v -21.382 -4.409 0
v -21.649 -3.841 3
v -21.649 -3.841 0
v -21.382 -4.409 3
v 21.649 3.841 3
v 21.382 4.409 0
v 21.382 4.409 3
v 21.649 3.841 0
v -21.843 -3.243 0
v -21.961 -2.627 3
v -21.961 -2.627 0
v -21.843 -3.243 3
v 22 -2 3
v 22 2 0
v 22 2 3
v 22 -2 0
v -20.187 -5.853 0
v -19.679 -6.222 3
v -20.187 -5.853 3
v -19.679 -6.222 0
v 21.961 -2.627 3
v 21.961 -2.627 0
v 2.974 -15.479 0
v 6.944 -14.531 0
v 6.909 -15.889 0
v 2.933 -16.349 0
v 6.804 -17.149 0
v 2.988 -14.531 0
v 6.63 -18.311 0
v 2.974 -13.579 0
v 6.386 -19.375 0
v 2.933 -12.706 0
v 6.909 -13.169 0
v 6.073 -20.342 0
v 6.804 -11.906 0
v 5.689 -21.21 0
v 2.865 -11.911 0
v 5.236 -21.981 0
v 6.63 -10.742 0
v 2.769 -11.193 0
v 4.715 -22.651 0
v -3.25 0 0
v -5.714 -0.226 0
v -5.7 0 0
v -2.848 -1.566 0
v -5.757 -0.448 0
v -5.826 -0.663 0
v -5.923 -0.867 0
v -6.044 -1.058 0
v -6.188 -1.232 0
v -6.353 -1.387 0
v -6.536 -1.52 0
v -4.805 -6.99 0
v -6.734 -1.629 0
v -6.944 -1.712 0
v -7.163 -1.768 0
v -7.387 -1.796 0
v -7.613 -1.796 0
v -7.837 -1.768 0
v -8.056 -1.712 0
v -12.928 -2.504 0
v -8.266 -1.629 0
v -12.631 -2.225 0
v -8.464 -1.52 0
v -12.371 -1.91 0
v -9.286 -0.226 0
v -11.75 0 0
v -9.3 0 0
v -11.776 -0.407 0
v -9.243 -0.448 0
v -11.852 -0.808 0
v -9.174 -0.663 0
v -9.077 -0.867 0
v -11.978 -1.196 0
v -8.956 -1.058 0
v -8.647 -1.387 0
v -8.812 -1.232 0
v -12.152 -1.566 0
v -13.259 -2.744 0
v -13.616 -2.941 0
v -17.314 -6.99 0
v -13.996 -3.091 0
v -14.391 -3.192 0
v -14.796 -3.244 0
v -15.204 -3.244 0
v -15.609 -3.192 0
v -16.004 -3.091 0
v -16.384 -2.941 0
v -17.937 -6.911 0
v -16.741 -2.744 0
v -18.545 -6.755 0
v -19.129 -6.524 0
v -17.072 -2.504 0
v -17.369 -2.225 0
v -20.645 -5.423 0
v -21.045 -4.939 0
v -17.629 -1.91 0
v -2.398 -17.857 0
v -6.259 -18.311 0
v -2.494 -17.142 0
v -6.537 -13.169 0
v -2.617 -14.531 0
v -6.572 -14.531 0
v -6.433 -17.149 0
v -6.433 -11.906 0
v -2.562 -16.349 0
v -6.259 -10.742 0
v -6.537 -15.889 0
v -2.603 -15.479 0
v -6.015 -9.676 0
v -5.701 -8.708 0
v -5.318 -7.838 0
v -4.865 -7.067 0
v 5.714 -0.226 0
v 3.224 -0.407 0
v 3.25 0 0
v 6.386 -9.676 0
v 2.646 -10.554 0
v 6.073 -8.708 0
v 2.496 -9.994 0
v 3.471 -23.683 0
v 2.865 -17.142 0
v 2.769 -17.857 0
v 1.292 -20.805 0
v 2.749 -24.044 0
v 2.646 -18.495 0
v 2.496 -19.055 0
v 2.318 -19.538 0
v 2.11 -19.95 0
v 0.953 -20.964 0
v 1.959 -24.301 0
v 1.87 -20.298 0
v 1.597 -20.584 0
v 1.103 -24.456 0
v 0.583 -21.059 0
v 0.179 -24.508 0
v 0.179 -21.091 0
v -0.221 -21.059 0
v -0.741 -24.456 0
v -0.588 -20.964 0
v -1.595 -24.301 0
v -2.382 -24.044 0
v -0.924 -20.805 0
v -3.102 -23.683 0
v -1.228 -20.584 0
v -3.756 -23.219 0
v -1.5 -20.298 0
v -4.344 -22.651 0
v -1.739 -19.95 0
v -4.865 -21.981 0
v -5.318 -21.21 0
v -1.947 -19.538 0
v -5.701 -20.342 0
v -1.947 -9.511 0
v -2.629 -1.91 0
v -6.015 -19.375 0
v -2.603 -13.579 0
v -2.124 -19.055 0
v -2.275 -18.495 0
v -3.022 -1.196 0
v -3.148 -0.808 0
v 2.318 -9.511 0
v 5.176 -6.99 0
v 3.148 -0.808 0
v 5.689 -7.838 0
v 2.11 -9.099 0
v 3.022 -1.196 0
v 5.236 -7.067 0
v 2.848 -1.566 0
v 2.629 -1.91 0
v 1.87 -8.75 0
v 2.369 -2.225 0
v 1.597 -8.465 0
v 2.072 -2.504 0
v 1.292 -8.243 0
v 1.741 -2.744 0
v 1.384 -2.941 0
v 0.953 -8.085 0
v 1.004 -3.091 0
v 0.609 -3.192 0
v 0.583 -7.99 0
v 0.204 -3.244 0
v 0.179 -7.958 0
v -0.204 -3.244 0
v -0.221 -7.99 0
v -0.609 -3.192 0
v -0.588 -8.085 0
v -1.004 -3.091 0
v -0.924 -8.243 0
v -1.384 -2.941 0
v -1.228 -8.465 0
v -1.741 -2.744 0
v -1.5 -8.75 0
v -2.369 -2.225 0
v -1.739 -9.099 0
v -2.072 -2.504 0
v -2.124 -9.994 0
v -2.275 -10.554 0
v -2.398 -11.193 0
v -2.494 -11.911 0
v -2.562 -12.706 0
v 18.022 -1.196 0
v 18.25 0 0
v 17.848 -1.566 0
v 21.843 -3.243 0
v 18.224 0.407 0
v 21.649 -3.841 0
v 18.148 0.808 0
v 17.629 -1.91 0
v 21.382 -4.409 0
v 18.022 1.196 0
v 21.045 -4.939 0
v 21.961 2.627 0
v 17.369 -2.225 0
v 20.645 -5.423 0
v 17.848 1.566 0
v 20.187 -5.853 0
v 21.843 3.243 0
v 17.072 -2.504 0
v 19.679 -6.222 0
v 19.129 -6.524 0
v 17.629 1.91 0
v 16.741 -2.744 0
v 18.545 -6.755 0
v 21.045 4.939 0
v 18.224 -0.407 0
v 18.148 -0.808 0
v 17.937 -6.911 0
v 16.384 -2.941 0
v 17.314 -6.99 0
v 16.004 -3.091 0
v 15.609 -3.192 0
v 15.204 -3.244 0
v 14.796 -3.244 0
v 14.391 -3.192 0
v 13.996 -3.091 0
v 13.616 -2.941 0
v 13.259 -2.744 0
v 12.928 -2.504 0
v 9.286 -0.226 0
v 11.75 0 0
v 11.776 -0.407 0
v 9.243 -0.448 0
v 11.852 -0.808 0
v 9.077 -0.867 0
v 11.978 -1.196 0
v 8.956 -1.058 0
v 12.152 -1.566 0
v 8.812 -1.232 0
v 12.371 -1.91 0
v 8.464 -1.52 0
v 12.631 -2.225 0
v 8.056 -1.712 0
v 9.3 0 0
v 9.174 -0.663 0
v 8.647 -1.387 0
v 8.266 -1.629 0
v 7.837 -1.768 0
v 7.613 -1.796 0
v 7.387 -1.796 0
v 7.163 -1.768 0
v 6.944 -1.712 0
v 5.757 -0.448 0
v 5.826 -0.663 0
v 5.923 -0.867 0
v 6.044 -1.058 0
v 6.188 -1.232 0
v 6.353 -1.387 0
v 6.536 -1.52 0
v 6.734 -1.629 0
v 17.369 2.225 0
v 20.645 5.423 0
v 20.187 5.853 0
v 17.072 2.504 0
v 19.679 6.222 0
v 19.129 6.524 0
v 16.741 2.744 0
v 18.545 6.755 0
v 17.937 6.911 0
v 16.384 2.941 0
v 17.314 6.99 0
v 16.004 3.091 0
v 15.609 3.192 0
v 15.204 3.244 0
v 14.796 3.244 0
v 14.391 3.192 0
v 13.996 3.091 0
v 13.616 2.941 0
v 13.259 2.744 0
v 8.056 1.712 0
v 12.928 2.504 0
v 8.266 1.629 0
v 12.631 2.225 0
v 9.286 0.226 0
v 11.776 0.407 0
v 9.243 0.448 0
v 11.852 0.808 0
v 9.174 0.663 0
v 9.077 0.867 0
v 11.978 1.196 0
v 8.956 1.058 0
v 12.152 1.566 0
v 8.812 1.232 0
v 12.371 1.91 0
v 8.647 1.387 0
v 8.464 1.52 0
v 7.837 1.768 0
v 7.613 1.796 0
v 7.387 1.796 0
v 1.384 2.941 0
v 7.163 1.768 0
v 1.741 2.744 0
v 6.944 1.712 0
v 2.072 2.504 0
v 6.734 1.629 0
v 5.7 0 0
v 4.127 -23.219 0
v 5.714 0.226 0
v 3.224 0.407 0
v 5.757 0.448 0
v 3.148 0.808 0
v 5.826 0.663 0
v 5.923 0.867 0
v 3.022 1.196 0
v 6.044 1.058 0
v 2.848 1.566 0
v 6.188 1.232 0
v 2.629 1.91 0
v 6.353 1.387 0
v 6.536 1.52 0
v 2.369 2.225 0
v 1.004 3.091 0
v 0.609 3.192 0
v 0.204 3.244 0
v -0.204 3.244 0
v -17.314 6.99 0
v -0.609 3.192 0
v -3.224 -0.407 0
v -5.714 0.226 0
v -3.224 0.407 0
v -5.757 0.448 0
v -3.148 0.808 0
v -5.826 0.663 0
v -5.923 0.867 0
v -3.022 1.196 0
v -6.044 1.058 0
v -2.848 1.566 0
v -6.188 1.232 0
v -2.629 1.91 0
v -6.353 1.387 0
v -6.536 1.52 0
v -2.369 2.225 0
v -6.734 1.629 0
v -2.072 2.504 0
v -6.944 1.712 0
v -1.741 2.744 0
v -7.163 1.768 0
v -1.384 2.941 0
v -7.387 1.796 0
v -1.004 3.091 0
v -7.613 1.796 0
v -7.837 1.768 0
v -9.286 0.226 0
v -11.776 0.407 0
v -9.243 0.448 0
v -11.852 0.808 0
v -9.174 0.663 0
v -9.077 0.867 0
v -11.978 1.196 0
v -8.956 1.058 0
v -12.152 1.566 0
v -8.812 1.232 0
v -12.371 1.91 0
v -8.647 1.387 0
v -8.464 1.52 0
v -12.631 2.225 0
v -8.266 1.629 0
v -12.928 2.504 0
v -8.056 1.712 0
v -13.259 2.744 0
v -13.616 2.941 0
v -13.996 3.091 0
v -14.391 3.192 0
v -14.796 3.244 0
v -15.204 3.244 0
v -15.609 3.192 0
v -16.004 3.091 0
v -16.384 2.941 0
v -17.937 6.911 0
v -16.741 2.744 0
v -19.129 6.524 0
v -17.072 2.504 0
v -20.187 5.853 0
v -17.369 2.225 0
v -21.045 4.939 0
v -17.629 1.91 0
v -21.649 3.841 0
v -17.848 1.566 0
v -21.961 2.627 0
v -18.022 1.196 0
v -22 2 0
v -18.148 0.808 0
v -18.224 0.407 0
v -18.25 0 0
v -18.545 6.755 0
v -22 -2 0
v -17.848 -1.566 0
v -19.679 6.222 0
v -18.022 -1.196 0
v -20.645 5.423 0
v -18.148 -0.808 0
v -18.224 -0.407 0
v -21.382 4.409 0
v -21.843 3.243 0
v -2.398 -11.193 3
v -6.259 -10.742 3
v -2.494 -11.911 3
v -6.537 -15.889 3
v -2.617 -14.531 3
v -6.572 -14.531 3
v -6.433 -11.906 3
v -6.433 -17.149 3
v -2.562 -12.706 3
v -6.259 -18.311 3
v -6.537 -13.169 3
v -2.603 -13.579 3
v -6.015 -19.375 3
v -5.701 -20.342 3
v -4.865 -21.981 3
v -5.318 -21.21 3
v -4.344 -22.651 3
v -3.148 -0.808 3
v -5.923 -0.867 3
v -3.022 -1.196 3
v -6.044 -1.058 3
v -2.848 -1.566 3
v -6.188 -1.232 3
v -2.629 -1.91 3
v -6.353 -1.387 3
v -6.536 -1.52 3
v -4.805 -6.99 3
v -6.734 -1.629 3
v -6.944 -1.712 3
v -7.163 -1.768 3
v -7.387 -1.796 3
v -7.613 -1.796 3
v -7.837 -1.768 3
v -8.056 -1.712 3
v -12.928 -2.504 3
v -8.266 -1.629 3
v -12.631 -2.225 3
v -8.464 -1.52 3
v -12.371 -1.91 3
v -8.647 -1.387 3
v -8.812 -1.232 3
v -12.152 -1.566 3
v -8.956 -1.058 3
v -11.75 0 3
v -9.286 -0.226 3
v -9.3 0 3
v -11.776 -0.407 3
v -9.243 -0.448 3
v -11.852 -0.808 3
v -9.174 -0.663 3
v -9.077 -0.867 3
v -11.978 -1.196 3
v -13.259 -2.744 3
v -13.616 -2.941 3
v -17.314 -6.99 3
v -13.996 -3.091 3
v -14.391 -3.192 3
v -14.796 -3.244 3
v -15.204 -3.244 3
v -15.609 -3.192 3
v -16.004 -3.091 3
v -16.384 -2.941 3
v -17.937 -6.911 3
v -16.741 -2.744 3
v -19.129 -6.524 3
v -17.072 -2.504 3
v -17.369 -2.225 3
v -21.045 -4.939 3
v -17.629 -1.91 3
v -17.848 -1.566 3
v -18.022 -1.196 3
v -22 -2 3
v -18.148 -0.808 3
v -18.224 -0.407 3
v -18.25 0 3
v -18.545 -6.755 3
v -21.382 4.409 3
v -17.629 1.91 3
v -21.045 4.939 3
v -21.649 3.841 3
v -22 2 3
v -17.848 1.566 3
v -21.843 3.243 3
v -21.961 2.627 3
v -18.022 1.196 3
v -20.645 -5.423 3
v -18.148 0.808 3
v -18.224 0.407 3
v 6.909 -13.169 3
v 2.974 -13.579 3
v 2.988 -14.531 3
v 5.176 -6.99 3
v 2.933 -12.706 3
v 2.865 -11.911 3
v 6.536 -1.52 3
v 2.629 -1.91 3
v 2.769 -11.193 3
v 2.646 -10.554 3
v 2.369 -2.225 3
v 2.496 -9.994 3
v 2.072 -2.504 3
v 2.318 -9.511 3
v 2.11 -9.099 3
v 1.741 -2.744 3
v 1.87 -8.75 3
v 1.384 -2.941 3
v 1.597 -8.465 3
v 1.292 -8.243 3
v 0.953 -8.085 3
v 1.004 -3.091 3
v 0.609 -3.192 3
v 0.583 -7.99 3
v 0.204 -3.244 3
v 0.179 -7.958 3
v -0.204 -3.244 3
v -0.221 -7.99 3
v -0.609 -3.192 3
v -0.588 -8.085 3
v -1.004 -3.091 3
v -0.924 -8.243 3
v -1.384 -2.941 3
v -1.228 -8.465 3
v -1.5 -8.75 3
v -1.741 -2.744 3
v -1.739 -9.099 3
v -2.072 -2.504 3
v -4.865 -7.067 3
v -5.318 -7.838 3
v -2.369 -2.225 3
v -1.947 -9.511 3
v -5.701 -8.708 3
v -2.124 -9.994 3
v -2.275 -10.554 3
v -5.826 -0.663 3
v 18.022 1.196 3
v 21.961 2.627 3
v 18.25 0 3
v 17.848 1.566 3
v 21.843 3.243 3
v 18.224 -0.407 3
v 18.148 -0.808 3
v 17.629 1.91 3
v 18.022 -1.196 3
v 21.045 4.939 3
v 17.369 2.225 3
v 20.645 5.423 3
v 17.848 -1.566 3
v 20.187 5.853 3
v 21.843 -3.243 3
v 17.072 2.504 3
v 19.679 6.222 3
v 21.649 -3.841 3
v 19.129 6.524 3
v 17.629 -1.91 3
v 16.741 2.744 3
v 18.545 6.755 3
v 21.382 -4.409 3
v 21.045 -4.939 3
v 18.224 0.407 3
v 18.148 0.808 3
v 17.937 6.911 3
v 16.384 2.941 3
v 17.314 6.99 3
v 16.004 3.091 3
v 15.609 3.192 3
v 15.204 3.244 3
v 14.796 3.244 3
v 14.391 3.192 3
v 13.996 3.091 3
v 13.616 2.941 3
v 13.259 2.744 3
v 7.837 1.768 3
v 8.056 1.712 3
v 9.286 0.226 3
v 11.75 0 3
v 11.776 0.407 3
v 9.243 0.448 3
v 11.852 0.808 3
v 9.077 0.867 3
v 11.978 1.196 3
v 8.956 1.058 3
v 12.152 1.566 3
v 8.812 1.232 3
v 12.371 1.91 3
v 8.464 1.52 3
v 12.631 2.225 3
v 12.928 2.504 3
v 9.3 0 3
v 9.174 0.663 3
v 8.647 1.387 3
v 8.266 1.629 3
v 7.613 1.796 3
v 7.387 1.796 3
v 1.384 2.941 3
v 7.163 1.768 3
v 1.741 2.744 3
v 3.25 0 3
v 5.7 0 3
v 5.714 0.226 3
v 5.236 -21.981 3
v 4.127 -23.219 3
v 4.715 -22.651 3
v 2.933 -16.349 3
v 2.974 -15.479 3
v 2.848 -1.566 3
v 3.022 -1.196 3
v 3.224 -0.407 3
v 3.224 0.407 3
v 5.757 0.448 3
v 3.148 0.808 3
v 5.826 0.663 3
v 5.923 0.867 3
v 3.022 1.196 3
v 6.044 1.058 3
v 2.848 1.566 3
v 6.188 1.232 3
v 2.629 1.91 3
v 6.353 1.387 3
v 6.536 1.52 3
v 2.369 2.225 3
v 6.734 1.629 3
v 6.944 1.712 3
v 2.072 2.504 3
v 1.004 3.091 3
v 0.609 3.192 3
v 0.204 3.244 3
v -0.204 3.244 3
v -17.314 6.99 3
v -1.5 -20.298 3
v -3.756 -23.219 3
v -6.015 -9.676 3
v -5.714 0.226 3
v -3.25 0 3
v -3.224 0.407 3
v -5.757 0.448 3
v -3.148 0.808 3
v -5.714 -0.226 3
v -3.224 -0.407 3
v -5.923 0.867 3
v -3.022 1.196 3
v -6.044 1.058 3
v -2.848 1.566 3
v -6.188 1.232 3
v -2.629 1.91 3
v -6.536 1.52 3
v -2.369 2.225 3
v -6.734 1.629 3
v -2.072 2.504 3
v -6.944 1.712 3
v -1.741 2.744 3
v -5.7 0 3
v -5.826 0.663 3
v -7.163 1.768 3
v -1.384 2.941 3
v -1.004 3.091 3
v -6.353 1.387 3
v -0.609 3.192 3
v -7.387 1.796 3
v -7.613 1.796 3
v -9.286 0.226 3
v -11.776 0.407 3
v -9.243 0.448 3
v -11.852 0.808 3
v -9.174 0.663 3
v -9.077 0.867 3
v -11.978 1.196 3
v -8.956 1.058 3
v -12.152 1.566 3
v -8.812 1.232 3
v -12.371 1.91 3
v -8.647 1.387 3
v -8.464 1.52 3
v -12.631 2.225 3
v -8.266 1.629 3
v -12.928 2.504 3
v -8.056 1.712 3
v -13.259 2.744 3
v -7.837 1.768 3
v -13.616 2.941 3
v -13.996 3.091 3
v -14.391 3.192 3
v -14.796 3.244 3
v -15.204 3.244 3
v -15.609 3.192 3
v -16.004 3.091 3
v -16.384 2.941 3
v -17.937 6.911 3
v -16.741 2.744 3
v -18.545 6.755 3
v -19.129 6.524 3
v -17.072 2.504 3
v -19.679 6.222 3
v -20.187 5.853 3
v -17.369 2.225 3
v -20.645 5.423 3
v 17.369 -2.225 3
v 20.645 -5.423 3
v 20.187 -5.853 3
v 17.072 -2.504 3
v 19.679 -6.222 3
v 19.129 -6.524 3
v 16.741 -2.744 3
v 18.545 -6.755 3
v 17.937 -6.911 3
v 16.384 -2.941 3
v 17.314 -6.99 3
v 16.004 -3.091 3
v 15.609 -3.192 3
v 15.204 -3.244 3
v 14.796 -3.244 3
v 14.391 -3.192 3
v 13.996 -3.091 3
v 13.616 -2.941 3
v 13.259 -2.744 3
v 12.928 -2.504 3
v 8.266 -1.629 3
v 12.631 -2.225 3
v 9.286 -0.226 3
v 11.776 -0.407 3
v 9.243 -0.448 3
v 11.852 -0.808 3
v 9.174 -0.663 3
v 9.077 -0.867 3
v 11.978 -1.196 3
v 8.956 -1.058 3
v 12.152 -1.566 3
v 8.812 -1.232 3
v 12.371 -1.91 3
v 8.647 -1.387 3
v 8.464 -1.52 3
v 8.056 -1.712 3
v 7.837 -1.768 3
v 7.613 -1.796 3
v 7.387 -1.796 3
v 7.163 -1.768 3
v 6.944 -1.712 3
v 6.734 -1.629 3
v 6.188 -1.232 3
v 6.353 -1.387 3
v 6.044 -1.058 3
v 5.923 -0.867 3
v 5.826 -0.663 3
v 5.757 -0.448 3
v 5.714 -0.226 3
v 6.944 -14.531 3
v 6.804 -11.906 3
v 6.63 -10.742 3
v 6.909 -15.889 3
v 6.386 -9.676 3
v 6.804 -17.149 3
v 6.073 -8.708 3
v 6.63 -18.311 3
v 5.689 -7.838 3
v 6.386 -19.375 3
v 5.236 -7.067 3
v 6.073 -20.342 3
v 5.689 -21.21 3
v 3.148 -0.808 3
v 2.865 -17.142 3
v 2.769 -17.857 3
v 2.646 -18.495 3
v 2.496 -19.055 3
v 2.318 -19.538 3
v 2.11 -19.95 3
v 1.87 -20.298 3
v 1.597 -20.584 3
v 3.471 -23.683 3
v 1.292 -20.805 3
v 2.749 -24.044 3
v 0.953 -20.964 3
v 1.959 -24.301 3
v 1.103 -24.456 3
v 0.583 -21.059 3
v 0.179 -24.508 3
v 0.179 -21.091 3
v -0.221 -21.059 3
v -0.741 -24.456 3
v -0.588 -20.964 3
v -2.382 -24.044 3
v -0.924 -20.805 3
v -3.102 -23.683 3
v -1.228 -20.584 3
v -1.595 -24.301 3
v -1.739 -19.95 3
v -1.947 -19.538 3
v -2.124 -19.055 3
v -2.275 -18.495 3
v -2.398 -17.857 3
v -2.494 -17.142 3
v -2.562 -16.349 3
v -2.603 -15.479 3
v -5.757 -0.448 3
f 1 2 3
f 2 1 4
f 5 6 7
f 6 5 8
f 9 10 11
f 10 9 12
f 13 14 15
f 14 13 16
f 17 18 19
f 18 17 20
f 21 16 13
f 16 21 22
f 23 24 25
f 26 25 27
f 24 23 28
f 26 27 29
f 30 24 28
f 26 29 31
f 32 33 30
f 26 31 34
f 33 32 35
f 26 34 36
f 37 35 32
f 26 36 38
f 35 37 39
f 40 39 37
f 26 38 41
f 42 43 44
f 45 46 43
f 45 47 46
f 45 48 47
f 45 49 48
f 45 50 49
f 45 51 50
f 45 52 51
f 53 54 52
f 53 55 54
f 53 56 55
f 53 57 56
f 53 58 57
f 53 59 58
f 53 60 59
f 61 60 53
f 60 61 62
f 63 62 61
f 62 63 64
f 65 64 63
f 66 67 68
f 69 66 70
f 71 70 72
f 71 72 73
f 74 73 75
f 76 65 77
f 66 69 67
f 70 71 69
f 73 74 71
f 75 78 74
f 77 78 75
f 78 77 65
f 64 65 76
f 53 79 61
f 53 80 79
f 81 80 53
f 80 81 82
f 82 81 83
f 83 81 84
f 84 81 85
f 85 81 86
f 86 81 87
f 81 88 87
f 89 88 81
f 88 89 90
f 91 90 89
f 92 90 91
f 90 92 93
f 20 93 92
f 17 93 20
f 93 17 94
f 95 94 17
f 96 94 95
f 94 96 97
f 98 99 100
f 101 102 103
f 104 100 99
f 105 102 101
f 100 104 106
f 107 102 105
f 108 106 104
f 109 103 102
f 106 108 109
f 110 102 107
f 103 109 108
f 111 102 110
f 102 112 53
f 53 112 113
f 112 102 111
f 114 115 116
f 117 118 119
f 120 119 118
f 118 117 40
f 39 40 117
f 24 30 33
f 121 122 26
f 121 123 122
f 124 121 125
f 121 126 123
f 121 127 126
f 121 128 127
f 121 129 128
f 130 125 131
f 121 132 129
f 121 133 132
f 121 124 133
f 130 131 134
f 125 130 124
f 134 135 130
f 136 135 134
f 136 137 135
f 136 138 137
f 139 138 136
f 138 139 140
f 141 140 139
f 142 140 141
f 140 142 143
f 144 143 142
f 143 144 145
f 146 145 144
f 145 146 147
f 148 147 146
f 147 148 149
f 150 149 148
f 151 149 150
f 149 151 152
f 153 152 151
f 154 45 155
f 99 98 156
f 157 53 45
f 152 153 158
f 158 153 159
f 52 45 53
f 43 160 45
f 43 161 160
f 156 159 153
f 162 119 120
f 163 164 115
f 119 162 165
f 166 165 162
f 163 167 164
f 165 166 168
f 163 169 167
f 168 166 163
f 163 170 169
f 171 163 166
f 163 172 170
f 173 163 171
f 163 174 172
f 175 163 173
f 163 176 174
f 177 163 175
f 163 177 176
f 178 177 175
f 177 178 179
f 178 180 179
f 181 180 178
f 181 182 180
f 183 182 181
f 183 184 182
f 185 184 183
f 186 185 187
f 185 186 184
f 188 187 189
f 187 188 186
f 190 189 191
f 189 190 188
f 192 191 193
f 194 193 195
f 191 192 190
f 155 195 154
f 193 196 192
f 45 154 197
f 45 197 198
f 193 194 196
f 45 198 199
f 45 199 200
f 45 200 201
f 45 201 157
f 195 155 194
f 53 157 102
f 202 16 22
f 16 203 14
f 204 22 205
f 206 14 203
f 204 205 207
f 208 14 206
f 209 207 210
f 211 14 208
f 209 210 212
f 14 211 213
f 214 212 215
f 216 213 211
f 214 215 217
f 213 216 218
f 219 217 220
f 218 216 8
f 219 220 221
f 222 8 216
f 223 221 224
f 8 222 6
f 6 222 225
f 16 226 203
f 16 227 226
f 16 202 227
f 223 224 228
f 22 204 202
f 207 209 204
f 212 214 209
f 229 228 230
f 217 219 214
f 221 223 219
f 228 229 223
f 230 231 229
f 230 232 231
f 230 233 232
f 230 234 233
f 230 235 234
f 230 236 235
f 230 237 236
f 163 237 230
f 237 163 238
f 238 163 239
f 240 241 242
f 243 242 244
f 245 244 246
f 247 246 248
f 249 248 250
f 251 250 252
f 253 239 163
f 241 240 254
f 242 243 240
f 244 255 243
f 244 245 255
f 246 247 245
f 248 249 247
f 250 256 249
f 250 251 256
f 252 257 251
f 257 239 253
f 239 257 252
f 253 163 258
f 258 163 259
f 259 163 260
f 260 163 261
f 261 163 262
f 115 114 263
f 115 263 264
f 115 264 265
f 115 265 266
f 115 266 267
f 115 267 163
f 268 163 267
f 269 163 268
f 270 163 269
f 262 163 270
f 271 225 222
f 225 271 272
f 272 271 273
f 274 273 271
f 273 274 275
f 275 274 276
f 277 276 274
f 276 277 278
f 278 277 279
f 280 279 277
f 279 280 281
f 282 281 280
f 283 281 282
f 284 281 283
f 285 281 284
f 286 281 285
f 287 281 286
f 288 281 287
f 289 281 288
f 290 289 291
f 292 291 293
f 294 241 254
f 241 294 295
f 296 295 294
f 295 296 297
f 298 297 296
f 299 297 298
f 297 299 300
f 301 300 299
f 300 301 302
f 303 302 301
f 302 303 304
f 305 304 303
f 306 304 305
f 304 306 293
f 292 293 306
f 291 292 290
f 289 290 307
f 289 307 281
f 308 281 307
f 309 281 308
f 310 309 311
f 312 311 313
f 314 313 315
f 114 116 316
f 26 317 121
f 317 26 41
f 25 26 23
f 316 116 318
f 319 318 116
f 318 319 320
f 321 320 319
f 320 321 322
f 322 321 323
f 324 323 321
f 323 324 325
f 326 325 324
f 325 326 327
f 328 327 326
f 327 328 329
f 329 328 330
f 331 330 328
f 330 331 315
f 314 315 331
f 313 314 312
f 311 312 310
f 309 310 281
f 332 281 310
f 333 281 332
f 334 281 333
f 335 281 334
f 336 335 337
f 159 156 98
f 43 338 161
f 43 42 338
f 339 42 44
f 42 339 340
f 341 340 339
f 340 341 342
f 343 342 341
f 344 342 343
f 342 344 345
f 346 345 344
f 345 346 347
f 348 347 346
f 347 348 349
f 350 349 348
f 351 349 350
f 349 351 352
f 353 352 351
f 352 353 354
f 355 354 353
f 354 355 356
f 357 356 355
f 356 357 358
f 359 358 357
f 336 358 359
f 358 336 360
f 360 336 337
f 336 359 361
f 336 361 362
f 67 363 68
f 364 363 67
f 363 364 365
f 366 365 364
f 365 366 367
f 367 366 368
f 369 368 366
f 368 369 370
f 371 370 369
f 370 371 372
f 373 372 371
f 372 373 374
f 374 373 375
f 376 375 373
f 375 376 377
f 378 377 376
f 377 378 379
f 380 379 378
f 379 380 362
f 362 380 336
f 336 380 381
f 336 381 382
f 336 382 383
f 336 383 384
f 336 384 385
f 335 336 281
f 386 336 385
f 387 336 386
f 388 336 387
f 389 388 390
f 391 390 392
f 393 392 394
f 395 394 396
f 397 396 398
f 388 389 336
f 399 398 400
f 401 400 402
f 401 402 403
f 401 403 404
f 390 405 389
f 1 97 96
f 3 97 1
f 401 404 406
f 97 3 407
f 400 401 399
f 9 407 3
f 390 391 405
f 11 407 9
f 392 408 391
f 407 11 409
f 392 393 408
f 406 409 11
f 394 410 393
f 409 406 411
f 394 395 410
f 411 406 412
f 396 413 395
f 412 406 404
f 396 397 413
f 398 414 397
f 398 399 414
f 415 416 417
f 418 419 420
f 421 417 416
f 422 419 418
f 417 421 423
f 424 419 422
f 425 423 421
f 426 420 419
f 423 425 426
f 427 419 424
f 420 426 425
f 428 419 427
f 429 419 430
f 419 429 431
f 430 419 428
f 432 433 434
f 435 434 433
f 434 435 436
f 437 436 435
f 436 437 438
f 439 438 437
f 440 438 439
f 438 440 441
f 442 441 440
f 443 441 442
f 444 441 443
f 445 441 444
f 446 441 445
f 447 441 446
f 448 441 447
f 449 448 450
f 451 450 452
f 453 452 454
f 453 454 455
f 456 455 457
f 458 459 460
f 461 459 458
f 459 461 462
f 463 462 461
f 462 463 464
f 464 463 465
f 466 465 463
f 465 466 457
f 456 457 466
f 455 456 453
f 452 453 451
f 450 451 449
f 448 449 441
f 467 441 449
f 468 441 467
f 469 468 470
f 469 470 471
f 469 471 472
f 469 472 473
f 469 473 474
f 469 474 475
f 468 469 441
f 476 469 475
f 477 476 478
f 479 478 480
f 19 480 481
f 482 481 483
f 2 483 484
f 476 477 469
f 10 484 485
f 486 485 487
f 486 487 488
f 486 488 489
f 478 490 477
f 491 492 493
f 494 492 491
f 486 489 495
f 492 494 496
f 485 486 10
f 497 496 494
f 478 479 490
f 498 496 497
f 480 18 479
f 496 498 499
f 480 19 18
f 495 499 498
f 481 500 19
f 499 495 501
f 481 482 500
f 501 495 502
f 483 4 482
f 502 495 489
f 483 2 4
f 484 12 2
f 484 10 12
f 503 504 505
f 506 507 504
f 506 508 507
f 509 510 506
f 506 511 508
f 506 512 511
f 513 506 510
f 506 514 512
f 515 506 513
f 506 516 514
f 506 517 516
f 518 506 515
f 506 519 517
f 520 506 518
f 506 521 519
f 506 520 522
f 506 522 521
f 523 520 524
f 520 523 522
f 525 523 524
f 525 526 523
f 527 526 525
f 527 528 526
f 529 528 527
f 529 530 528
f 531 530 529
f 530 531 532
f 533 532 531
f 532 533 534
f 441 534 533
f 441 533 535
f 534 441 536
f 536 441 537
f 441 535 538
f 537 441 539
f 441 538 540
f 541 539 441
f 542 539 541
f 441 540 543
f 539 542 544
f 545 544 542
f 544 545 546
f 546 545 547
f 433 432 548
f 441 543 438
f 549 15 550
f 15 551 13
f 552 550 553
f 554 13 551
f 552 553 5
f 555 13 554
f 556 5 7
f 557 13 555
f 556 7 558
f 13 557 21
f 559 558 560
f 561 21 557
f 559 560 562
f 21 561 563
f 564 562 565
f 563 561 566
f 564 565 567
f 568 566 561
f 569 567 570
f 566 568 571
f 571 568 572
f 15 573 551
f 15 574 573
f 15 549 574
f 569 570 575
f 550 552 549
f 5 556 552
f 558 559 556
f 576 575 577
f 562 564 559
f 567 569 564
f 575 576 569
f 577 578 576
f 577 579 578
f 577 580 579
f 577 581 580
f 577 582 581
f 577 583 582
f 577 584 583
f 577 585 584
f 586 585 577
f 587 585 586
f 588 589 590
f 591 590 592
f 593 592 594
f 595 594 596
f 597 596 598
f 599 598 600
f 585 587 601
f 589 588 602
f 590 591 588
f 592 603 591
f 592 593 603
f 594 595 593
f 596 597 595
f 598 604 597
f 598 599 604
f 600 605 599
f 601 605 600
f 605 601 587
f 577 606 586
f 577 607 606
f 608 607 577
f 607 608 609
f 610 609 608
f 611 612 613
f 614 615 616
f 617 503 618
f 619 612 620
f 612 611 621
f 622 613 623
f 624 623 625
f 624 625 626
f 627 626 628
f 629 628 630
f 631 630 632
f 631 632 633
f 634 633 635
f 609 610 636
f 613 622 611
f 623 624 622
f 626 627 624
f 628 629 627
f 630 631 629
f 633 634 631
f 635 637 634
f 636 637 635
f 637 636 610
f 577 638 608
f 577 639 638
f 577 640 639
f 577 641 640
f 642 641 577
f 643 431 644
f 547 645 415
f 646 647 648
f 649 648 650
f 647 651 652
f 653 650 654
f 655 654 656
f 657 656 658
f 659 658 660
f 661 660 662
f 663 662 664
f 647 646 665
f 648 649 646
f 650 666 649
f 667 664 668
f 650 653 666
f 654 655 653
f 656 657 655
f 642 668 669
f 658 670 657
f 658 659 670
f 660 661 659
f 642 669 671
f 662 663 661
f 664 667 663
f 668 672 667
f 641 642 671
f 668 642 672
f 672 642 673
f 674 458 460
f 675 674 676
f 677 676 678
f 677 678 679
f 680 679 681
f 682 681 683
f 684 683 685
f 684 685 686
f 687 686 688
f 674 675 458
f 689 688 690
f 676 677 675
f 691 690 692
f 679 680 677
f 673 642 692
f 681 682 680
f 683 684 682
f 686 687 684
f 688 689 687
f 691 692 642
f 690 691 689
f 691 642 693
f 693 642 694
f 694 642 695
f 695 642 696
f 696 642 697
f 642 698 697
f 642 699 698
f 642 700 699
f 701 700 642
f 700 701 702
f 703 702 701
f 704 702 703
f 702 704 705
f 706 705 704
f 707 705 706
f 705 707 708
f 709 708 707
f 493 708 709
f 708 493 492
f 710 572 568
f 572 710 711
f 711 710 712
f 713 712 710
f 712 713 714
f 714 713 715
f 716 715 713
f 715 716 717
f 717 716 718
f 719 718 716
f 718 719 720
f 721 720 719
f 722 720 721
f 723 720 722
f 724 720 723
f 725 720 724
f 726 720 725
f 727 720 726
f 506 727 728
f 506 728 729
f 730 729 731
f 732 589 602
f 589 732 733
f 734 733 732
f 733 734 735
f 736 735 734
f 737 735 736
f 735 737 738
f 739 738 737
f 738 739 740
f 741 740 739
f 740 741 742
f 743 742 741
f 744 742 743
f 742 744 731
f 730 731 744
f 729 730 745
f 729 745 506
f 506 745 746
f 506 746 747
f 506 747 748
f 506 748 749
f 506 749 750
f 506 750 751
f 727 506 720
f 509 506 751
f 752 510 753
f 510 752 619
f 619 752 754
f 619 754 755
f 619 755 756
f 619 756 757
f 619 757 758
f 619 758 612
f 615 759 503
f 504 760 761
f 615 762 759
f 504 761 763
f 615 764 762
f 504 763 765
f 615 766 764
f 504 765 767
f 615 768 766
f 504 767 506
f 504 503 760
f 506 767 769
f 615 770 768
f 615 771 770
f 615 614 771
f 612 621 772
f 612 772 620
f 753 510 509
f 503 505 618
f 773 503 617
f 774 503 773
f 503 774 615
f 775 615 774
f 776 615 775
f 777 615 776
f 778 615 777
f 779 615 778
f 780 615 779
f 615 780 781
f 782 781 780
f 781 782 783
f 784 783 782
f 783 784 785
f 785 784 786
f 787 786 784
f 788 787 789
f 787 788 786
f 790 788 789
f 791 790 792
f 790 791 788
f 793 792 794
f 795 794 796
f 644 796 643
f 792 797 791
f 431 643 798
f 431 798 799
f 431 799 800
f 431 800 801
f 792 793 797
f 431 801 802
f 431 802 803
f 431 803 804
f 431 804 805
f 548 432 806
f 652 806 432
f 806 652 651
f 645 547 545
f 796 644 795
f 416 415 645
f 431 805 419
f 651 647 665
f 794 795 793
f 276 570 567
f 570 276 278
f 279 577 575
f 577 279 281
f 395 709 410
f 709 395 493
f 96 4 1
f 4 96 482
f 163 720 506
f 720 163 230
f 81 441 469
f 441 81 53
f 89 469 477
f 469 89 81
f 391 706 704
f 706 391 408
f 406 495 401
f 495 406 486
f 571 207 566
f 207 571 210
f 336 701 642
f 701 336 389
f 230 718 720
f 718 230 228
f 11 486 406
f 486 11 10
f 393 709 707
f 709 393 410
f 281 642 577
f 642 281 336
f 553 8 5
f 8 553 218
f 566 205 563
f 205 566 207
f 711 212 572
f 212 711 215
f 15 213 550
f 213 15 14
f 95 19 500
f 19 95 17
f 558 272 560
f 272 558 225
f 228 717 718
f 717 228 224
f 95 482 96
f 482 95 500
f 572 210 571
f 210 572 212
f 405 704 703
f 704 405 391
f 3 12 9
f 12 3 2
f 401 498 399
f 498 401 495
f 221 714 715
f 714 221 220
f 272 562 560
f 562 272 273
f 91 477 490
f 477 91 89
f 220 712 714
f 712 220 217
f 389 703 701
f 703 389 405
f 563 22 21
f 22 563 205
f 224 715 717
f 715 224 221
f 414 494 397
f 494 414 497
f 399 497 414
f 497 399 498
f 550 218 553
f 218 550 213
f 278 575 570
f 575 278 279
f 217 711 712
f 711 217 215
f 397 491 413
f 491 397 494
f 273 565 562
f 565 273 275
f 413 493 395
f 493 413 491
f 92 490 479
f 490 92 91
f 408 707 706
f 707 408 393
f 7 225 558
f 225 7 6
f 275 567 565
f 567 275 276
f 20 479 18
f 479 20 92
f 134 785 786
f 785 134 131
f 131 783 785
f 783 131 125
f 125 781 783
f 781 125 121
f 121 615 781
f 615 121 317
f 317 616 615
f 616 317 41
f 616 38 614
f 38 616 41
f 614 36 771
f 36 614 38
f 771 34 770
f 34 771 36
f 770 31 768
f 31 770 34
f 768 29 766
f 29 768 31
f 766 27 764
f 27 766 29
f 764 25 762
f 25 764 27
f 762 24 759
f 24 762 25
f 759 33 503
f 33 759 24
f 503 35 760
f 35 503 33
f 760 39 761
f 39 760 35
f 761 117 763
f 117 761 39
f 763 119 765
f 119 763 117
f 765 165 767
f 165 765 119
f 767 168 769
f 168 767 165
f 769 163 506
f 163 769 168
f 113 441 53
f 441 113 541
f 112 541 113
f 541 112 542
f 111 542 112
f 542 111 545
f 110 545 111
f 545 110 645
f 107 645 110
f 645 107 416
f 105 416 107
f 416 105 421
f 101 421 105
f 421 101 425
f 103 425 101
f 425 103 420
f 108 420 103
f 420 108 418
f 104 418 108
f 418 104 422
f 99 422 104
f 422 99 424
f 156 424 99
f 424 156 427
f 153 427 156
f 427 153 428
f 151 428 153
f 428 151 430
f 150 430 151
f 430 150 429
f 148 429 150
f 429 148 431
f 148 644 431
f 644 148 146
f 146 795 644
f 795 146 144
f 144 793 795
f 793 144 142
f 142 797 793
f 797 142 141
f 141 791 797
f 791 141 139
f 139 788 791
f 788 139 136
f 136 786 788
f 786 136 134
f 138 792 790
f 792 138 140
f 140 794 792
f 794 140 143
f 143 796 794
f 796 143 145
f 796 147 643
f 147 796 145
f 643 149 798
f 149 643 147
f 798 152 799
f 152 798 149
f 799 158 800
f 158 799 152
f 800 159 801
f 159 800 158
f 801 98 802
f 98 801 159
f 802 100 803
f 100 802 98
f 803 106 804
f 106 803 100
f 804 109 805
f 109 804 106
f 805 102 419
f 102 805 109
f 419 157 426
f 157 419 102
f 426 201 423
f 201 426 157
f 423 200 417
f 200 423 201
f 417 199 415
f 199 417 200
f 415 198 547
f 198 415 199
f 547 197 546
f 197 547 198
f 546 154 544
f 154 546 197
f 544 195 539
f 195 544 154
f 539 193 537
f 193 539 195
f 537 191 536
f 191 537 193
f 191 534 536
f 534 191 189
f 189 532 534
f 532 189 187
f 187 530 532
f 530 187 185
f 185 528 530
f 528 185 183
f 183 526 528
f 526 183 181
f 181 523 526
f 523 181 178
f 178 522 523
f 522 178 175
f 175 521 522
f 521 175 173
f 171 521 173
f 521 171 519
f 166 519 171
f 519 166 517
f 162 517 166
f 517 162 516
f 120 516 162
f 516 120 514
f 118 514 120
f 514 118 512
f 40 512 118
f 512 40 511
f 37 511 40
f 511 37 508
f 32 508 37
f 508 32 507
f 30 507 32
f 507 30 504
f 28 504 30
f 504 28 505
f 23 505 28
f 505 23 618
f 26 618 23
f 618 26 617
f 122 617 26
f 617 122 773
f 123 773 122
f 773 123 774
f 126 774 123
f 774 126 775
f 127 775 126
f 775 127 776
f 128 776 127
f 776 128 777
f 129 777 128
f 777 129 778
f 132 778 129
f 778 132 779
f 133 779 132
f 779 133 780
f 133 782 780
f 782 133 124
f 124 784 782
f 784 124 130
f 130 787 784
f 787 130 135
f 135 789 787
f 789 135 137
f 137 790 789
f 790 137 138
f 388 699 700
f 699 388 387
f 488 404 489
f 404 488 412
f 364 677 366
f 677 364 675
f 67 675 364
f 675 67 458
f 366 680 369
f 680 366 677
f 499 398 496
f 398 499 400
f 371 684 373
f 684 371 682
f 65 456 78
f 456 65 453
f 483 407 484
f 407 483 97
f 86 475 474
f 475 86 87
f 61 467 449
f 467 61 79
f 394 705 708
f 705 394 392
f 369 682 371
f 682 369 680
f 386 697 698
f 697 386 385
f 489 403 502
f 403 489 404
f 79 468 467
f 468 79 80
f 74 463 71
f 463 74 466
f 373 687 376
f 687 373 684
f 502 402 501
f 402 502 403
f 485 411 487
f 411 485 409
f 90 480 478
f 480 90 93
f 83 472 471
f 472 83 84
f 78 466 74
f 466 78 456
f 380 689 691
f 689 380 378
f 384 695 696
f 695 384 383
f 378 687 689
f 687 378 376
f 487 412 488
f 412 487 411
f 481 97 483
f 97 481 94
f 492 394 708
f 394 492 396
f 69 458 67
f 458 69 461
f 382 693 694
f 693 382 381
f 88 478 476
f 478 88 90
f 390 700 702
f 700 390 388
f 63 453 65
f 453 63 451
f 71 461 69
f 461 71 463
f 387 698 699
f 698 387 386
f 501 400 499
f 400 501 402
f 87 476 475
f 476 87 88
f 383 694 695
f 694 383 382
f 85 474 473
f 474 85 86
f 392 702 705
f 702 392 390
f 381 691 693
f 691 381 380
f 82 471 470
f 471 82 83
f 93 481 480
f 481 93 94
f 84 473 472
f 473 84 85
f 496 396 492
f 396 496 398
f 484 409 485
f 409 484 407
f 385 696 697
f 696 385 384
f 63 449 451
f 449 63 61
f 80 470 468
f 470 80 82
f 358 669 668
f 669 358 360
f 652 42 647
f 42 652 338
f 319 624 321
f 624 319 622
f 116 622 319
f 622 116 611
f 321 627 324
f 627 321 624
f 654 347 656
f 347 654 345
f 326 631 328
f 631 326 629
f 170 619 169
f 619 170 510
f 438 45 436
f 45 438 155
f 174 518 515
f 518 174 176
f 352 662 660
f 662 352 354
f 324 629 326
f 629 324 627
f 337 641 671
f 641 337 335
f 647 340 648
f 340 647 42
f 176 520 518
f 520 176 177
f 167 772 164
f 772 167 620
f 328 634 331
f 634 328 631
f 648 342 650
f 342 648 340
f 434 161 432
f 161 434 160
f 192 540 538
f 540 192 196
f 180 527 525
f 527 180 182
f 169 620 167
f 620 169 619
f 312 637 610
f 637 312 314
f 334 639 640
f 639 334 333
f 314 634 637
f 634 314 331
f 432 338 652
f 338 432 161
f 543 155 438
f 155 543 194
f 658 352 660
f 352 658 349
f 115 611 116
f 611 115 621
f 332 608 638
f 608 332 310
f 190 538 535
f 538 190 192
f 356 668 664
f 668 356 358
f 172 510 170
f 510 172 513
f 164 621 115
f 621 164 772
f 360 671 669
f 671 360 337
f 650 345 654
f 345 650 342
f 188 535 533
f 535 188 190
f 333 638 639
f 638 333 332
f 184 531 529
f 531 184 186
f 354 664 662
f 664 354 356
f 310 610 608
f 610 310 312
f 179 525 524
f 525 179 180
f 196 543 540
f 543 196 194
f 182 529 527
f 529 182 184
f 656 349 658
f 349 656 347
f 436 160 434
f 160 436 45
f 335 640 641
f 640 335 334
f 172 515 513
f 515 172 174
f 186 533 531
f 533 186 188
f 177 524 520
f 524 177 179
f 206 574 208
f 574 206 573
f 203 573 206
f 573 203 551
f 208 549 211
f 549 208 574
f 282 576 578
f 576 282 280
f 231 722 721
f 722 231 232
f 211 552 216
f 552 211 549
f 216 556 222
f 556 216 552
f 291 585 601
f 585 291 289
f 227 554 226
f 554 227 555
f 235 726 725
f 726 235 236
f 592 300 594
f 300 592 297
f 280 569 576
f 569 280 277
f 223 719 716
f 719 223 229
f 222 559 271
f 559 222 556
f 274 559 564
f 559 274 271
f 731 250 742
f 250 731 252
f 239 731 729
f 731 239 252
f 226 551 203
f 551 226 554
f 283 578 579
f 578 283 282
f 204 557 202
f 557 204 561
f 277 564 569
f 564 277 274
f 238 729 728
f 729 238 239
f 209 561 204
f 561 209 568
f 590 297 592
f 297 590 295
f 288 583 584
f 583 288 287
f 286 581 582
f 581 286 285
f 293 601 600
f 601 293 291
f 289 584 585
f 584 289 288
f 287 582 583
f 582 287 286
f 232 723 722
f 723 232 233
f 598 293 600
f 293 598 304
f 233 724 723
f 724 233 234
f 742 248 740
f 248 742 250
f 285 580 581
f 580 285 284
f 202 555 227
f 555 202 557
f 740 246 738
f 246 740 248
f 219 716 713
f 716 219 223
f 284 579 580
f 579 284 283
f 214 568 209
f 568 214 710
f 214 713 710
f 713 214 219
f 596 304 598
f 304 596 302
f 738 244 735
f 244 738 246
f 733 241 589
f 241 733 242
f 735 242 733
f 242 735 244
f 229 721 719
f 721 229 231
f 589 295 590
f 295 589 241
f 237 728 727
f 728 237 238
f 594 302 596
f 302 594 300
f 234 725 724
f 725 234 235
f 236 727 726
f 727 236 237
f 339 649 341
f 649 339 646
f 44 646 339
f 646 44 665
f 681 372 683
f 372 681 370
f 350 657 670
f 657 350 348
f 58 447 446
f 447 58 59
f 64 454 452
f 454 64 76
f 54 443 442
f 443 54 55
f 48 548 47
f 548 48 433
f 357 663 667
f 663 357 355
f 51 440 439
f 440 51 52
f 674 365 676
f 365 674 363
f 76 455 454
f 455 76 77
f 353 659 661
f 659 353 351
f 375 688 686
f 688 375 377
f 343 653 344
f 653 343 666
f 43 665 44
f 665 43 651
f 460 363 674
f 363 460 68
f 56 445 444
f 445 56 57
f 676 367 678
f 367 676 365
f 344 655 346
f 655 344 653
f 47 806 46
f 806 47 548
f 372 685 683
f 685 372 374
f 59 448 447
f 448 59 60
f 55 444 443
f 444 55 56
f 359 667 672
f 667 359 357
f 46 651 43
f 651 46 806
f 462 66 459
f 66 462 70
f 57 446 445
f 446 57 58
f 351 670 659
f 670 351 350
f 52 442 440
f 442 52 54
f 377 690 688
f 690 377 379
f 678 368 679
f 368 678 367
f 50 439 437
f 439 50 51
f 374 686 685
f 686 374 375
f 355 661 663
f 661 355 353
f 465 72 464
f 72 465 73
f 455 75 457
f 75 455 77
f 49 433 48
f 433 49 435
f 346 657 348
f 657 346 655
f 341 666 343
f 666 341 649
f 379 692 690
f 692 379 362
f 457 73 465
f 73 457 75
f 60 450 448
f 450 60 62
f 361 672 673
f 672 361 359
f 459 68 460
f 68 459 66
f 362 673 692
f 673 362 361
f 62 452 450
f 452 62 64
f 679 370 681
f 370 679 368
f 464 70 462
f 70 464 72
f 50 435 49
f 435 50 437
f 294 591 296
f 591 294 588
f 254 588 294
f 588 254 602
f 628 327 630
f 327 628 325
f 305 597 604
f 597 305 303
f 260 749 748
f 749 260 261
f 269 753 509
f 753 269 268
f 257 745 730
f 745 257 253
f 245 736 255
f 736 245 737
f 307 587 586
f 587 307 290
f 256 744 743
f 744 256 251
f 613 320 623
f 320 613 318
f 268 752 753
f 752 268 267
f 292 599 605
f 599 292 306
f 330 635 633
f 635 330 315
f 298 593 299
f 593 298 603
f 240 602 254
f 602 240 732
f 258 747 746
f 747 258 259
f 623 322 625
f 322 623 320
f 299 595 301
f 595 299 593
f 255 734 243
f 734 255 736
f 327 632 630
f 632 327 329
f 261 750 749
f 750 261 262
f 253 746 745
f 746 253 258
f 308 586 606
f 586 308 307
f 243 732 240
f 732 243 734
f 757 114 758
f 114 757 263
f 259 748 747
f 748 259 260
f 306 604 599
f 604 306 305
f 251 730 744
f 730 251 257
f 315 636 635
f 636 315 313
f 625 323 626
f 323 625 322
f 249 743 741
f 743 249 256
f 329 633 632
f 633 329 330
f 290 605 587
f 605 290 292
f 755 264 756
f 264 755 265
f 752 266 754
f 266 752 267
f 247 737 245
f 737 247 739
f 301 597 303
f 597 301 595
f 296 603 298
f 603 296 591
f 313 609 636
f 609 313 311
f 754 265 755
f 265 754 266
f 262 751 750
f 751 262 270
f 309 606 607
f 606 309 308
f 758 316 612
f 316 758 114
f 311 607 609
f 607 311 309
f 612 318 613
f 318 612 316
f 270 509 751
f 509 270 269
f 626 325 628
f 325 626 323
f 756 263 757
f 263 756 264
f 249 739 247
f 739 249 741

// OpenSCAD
$fn = 50;


difference() {
	union() {
		hull() {
			translate(v = [-17.0000000000, 2.0000000000, 0]) {
				cylinder(h = 3, r = 5);
			}
			translate(v = [17.0000000000, 2.0000000000, 0]) {
				cylinder(h = 3, r = 5);
			}
			translate(v = [-17.0000000000, -2.0000000000, 0]) {
				cylinder(h = 3, r = 5);
			}
			translate(v = [17.0000000000, -2.0000000000, 0]) {
				cylinder(h = 3, r = 5);
			}
		}
		translate(v = [0, -5, 0]) {
			linear_extrude(height = 3) {
				text(font = "DejaVu Sans Mono:style=Bold", halign = "center", size = 19.0000000000, text = "O", valign = "top");
			}
		}
	}
	union() {
		translate(v = [-15.0000000000, 0.0000000000, 0]) {
			translate(v = [0, 0, -100]) {
				cylinder(h = 200, r = 3.2500000000);
			}
		}
		translate(v = [0, 0, -100]) {
			cylinder(h = 200, r = 3.2500000000);
		}
		translate(v = [15.0000000000, 0.0000000000, 0]) {
			translate(v = [0, 0, -100]) {
				cylinder(h = 200, r = 3.2500000000);
			}
		}
		translate(v = [-15.0000000000, 0.0000000000, 0]) {
			translate(v = [0, 0, -100]) {
				cylinder(h = 200, r = 1.8000000000);
			}
		}
		translate(v = [-7.5000000000, 0.0000000000, 0]) {
			translate(v = [0, 0, -100]) {
				cylinder(h = 200, r = 1.8000000000);
			}
		}
		translate(v = [0, 0, -100]) {
			cylinder(h = 200, r = 1.8000000000);
		}
		translate(v = [7.5000000000, 0.0000000000, 0]) {
			translate(v = [0, 0, -100]) {
				cylinder(h = 200, r = 1.8000000000);
			}
		}
		translate(v = [15.0000000000, 0.0000000000, 0]) {
			translate(v = [0, 0, -100]) {
				cylinder(h = 200, r = 1.8000000000);
			}
		}
	}
}
